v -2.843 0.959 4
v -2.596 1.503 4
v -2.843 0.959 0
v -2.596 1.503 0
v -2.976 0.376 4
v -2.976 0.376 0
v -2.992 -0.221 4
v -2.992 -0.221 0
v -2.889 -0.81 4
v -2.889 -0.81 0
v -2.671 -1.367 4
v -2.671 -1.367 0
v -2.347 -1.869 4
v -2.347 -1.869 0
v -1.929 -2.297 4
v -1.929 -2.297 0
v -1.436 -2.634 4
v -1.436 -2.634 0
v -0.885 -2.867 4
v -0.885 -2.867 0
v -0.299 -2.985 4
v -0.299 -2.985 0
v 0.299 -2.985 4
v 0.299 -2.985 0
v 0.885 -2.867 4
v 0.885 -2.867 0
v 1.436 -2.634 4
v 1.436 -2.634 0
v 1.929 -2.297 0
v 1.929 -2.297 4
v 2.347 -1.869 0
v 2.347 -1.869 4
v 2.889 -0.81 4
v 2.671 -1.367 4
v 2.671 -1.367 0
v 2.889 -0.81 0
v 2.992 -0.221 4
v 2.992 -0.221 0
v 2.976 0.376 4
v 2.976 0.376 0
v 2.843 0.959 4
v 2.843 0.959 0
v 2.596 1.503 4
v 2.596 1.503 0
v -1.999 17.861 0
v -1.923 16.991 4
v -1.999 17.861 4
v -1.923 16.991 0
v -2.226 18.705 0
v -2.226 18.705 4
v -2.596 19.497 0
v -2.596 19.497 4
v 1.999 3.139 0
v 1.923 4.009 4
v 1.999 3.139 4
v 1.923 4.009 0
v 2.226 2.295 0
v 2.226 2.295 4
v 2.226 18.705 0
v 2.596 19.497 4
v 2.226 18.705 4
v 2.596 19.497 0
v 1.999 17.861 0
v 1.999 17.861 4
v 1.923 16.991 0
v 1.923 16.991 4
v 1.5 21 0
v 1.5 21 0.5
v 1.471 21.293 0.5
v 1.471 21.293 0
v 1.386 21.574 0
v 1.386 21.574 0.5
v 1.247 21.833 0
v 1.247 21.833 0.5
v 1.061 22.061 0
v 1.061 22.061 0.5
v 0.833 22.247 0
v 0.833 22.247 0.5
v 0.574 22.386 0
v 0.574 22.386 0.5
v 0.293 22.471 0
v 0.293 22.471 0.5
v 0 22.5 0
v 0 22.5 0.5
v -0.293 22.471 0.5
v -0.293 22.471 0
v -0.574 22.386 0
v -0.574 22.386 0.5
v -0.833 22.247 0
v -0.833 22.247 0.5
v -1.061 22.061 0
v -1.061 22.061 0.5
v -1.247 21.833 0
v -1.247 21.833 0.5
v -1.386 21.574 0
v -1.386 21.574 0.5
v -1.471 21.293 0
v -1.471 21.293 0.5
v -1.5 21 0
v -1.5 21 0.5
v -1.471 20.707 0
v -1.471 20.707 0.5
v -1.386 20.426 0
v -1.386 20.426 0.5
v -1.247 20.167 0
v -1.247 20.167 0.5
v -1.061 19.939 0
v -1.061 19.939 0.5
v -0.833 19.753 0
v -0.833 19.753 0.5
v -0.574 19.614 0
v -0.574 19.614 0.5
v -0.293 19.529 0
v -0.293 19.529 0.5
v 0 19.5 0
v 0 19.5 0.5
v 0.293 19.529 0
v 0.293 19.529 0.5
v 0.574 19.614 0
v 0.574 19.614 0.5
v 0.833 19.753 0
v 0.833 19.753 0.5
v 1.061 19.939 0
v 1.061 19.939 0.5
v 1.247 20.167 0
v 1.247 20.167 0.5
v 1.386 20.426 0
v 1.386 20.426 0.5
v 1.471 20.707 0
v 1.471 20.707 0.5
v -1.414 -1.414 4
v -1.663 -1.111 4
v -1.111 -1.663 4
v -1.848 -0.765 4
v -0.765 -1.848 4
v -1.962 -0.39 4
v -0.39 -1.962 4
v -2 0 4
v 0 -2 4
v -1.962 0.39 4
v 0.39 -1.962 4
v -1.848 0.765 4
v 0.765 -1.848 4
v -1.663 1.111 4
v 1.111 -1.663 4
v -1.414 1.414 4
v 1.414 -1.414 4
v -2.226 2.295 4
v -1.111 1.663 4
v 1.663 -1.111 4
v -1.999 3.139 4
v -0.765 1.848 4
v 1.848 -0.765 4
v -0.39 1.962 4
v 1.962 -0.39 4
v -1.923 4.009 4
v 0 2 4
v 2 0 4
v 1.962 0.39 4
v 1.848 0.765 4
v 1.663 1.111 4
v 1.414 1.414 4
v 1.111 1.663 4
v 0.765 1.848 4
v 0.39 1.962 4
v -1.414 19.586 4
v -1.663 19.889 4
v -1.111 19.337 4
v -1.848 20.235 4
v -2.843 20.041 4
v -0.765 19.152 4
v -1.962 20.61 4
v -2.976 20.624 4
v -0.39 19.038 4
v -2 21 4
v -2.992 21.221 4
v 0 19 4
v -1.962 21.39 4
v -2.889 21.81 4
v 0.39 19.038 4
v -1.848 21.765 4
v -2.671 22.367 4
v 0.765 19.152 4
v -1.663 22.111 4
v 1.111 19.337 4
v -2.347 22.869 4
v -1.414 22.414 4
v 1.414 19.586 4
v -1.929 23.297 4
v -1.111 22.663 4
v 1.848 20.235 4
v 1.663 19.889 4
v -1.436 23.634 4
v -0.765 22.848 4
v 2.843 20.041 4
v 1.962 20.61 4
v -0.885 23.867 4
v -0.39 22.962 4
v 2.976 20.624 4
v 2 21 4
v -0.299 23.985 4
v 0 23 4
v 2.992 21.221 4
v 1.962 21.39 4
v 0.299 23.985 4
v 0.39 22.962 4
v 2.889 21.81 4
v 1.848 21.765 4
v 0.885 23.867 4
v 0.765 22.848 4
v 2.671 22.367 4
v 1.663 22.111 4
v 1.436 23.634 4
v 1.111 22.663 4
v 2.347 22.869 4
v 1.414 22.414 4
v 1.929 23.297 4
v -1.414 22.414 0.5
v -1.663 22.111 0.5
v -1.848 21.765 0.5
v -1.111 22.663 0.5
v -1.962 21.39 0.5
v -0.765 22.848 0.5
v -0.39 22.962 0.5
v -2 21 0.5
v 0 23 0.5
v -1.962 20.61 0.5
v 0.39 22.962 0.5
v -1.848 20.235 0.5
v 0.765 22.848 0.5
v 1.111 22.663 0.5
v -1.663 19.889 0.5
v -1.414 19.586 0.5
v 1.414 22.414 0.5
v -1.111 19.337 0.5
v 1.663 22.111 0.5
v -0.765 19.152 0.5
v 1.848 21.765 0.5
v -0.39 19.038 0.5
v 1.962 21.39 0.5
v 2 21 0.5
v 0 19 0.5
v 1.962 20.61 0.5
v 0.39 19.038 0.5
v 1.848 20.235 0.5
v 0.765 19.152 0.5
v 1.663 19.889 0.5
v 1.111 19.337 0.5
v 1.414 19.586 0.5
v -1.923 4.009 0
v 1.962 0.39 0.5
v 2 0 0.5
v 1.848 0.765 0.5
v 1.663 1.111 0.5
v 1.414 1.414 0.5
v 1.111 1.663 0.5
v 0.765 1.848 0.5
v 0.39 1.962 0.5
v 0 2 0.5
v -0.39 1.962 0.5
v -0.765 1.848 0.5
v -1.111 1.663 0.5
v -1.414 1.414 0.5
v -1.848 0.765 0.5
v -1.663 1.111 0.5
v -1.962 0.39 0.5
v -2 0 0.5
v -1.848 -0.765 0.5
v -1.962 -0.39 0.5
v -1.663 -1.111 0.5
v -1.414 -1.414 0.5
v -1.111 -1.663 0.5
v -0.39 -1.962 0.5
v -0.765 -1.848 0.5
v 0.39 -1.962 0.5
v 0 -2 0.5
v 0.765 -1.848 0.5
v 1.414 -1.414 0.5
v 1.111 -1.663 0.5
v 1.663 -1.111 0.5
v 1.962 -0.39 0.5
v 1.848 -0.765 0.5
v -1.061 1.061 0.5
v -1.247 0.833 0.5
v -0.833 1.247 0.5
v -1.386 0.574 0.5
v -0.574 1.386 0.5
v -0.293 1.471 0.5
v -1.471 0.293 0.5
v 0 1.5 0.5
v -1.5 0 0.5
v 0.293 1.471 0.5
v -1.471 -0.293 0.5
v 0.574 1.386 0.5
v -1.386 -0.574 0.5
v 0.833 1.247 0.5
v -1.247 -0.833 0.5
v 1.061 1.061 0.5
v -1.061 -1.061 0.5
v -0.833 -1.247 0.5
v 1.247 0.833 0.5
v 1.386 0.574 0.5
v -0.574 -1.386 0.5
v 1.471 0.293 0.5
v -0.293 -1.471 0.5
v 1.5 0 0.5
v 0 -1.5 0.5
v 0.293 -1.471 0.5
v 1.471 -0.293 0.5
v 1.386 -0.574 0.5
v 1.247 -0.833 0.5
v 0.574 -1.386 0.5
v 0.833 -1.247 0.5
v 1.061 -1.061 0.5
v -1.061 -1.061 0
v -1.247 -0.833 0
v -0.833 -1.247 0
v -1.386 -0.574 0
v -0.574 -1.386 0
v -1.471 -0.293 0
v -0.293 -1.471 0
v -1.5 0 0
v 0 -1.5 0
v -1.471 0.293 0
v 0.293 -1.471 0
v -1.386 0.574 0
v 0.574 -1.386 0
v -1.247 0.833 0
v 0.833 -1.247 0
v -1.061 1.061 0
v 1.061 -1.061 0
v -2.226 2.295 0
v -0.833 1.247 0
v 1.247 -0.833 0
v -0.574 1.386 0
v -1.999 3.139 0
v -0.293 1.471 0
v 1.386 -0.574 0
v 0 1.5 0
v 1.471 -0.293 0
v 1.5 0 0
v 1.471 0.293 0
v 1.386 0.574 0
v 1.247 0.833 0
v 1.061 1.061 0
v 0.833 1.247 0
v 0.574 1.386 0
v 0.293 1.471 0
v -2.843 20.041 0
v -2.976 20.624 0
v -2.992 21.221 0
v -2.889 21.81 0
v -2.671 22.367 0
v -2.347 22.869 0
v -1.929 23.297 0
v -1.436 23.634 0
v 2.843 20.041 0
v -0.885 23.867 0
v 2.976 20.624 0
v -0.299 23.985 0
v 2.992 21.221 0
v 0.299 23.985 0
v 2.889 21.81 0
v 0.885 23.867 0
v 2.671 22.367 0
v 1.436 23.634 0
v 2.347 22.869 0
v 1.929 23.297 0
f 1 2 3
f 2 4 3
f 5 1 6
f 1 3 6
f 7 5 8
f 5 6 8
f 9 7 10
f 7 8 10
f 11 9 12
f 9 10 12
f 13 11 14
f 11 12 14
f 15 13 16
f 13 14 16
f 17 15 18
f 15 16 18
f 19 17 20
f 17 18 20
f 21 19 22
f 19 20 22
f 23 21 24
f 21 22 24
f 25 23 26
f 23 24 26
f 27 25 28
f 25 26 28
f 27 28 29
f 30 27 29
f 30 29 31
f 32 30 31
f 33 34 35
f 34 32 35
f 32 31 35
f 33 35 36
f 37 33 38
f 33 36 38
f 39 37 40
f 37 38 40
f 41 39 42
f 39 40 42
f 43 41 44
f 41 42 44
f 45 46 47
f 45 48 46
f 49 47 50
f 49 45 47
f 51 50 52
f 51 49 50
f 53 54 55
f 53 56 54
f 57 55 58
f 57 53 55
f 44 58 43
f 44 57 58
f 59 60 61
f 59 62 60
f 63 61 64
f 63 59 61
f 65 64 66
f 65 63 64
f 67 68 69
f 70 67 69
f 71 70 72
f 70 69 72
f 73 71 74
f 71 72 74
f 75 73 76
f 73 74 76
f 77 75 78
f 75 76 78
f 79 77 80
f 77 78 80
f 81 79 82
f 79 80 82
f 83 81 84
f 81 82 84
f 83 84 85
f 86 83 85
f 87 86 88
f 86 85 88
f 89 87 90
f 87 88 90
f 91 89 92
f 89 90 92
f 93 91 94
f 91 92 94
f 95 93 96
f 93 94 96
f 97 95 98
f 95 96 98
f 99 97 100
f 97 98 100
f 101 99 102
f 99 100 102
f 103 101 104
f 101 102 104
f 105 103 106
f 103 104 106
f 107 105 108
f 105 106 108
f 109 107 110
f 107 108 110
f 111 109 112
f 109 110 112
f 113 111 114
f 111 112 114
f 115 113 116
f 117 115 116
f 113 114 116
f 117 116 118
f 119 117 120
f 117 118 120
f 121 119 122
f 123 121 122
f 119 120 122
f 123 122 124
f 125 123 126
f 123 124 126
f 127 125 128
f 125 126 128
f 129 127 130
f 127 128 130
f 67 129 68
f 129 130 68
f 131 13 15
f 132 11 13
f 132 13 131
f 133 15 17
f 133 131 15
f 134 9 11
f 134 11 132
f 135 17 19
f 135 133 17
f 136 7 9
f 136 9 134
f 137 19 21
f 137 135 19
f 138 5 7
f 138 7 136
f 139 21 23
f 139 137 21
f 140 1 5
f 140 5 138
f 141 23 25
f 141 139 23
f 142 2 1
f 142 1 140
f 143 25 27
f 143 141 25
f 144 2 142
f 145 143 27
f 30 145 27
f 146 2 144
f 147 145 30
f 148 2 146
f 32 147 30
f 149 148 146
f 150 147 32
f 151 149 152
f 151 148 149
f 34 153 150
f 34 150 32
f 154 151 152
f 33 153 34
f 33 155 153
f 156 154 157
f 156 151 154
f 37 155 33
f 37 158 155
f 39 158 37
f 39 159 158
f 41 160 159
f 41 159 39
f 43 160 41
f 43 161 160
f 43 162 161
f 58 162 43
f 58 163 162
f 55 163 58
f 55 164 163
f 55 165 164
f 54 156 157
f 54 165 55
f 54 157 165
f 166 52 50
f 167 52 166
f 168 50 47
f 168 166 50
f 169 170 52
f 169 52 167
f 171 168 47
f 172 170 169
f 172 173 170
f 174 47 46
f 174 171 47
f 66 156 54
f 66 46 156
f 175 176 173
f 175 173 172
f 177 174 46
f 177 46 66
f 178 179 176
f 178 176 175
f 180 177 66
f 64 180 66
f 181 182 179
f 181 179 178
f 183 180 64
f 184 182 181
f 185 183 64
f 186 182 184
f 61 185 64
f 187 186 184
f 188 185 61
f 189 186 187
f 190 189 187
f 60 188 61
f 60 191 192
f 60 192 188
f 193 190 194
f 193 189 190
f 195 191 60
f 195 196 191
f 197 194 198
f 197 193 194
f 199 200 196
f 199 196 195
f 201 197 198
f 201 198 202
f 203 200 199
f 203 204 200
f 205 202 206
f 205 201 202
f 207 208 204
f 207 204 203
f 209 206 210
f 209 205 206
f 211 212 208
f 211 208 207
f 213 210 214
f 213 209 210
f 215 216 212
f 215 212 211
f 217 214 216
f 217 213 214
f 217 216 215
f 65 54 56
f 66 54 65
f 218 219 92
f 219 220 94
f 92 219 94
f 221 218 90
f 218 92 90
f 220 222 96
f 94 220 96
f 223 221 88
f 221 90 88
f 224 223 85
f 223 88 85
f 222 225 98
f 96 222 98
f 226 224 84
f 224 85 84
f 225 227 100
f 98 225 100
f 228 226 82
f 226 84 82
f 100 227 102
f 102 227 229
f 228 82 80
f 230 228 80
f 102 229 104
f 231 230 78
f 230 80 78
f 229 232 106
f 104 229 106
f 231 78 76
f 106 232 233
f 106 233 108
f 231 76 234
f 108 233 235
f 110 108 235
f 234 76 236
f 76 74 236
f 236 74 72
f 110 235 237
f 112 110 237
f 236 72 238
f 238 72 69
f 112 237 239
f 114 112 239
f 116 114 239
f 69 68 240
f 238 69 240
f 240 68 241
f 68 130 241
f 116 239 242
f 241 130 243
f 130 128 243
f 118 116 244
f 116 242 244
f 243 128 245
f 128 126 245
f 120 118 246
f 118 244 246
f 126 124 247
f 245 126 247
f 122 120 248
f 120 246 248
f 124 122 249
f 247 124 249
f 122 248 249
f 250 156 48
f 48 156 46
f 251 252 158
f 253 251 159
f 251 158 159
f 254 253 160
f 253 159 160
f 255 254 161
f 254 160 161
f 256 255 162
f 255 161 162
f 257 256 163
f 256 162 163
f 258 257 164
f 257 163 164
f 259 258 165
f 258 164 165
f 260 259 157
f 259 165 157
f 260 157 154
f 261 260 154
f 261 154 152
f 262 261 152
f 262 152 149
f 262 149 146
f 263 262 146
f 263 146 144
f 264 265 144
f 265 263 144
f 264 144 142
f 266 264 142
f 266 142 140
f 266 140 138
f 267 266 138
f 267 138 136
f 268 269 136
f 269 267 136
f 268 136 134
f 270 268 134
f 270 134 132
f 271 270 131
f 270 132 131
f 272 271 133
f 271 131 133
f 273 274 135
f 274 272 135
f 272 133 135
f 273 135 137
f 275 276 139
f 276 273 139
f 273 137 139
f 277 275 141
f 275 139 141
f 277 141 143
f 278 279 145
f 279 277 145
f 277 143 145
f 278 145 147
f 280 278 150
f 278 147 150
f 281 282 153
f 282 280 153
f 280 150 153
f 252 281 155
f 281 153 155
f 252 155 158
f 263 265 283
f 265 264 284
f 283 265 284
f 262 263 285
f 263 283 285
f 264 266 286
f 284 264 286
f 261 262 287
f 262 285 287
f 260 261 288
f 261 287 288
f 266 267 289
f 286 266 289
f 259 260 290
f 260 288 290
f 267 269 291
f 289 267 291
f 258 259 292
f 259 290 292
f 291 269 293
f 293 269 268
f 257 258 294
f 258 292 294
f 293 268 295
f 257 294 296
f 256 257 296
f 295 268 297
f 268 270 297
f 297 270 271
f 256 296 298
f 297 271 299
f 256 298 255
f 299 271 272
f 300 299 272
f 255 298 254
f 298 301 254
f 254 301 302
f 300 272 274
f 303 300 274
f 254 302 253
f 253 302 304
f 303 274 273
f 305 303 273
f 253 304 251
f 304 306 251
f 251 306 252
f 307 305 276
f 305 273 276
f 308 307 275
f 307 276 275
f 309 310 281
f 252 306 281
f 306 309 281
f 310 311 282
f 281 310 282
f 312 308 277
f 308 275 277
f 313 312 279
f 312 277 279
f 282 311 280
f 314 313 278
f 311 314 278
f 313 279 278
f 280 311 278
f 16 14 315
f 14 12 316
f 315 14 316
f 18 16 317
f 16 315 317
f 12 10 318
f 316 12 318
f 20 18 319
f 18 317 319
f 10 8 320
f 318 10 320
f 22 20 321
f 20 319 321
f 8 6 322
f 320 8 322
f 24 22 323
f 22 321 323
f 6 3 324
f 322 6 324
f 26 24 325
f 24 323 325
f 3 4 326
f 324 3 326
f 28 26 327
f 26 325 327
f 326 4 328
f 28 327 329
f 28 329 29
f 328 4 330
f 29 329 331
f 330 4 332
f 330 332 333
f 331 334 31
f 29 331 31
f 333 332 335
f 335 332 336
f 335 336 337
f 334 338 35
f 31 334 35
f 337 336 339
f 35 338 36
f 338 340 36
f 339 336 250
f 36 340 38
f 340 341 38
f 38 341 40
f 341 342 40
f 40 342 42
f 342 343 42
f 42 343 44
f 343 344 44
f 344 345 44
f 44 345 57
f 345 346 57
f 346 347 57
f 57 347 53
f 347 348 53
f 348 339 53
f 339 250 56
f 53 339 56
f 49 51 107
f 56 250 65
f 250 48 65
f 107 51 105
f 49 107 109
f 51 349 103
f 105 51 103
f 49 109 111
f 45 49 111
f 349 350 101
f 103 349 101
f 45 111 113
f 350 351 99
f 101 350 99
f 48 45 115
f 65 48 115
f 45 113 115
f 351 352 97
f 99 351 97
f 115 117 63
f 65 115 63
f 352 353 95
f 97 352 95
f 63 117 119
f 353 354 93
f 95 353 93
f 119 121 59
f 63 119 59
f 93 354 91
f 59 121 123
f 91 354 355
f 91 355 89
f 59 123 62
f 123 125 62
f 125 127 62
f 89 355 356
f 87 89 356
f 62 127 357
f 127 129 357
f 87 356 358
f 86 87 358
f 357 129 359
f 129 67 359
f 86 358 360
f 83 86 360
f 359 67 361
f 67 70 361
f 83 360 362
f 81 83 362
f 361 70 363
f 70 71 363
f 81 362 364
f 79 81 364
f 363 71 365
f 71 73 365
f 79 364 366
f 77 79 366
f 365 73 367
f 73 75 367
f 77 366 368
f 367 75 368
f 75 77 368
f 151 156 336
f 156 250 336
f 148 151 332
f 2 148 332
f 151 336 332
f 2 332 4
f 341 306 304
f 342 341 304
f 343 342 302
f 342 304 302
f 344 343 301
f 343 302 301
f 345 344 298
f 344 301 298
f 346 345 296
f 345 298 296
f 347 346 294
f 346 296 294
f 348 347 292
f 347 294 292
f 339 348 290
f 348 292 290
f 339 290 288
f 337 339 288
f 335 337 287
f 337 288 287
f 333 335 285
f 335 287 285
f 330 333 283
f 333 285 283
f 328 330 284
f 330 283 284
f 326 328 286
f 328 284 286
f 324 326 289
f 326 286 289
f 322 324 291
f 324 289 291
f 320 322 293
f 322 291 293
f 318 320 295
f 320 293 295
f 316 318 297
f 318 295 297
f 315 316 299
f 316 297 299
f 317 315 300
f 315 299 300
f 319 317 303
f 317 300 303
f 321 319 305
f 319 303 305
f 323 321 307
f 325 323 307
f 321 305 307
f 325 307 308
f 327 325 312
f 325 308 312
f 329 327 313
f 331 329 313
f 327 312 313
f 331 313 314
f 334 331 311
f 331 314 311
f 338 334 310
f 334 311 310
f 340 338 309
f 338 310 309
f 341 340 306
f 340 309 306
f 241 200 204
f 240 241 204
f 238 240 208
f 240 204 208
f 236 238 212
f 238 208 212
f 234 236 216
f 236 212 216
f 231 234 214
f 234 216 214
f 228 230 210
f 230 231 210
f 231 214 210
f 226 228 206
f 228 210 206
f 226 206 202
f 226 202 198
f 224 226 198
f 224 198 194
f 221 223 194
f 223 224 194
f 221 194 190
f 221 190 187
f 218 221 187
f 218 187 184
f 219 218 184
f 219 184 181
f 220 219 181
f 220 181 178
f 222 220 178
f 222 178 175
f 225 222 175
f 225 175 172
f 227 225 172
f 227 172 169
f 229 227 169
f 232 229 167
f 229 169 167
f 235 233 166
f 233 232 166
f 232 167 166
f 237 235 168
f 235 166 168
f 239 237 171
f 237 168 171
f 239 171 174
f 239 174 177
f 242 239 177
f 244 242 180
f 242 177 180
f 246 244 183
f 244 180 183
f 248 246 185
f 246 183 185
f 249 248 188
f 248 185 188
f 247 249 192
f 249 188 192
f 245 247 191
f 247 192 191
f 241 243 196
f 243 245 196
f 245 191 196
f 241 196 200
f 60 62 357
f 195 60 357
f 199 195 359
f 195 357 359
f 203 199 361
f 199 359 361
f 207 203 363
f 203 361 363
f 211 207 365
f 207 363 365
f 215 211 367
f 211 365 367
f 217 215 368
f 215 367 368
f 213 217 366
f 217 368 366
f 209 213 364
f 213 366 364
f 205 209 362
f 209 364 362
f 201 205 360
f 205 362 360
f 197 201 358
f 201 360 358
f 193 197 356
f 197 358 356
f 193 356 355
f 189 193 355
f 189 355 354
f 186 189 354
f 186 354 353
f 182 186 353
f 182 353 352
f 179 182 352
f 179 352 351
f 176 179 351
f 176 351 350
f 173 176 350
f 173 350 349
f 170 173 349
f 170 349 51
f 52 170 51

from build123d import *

# Parameters (mm, degrees)
SKETCH6_R             = 3
BOSS_EXTRUDE4_DEPTH   = 4
BOSS_EXTRUDE4_2_DEPTH = 4
SKETCH7_R             = 2
CUT_EXTRUDE3_DEPTH    = 4
SKETCH8_W             = 3.845886706
SKETCH8_H             = 17
BOSS_EXTRUDE5_DEPTH   = 4
FILLET1_R             = 5
BOSS_EXTRUDE6_START   = -0.5
SKETCH9_R             = 2
BOSS_EXTRUDE6_DEPTH   = 0.5
SKETCH10_R            = 1.5
CUT_EXTRUDE4_DEPTH    = 0.5
BOSS_EXTRUDE7_START   = -0.5
SKETCH11_R            = 2
BOSS_EXTRUDE7_DEPTH   = 0.5
SKETCH12_R            = 1.5
CUT_EXTRUDE5_DEPTH    = 0.5


with BuildPart() as part:
    # Sketch6 → Boss-Extrude4 (new body)
    with BuildSketch(Plane.XY):
        Circle(SKETCH6_R)
    extrude(amount=BOSS_EXTRUDE4_DEPTH)


with BuildPart() as body_2:
    # Sketch6 → Boss-Extrude4 2 (new body)
    with BuildSketch(Plane.XY):
        with Locations((0, 21)):
            Circle(SKETCH6_R)
    extrude(amount=BOSS_EXTRUDE4_2_DEPTH)


with BuildPart() as cut_extrude3_tool:
    # Sketch7 → Cut-Extrude3 (new body)
    with BuildSketch(Plane.XY.offset(4)):
        with Locations((0, 21)):
            Circle(SKETCH7_R)
        Circle(SKETCH7_R)
    extrude(amount=-CUT_EXTRUDE3_DEPTH)


with BuildPart() as part_1:
    add(part.part)

    # Cut-Extrude3: cut by cut_extrude3_tool
    add(cut_extrude3_tool.part, mode=Mode.SUBTRACT)



with BuildPart() as body_2_1:
    add(body_2.part)

    # Cut-Extrude3: cut by cut_extrude3_tool
    add(cut_extrude3_tool.part, mode=Mode.SUBTRACT)


with BuildPart() as part_2:
    add(part_1.part)

    add(body_2_1.part)  # Boss-Extrude5 merges body 2
    # Sketch8 → Boss-Extrude5 (add)
    with BuildSketch(Plane.XY.offset(4)):
        with Locations((0, 10.5)):
            Rectangle(SKETCH8_W, SKETCH8_H)
    extrude(amount=-BOSS_EXTRUDE5_DEPTH)

    # Fillet1
    fillet1_edges = [part_2.edges().sort_by_distance(p)[0] for p in [
        (-1.922943353, 2.302669942, 2),
        (1.922943353, 2.302669942, 2),
        (1.922943353, 18.697330058, 2),
        (-1.922943353, 18.697330058, 2),
    ]]
    fillet(fillet1_edges, radius=FILLET1_R)

    # Sketch9 → Boss-Extrude6 (add)
    with BuildSketch(Plane(origin=(0, 0, 0), x_dir=(-1, 0, 0), z_dir=(0, 0, -1)).offset(BOSS_EXTRUDE6_START)):
        with Locations(Location((0, 21, 0), (0, 0, 180))):
            Circle(SKETCH9_R)
    extrude(amount=BOSS_EXTRUDE6_DEPTH)

    # Sketch10 → Cut-Extrude4 (cut)
    with BuildSketch(Plane.XY.offset(0.5)):
        with Locations((0, 21)):
            Circle(SKETCH10_R)
    extrude(amount=-CUT_EXTRUDE4_DEPTH, mode=Mode.SUBTRACT)

    # Sketch11 → Boss-Extrude7 (add)
    with BuildSketch(Plane(origin=(0, 0, 0), x_dir=(-1, 0, 0), z_dir=(0, 0, -1)).offset(BOSS_EXTRUDE7_START)):
        with Locations(Location((0, 0, 0), (0, 0, 180))):
            Circle(SKETCH11_R)
    extrude(amount=BOSS_EXTRUDE7_DEPTH)

    # Sketch12 → Cut-Extrude5 (cut)
    with BuildSketch(Plane.XY.offset(0.5)):
        Circle(SKETCH12_R)
    extrude(amount=-CUT_EXTRUDE5_DEPTH, mode=Mode.SUBTRACT)


solid = part_2.part
